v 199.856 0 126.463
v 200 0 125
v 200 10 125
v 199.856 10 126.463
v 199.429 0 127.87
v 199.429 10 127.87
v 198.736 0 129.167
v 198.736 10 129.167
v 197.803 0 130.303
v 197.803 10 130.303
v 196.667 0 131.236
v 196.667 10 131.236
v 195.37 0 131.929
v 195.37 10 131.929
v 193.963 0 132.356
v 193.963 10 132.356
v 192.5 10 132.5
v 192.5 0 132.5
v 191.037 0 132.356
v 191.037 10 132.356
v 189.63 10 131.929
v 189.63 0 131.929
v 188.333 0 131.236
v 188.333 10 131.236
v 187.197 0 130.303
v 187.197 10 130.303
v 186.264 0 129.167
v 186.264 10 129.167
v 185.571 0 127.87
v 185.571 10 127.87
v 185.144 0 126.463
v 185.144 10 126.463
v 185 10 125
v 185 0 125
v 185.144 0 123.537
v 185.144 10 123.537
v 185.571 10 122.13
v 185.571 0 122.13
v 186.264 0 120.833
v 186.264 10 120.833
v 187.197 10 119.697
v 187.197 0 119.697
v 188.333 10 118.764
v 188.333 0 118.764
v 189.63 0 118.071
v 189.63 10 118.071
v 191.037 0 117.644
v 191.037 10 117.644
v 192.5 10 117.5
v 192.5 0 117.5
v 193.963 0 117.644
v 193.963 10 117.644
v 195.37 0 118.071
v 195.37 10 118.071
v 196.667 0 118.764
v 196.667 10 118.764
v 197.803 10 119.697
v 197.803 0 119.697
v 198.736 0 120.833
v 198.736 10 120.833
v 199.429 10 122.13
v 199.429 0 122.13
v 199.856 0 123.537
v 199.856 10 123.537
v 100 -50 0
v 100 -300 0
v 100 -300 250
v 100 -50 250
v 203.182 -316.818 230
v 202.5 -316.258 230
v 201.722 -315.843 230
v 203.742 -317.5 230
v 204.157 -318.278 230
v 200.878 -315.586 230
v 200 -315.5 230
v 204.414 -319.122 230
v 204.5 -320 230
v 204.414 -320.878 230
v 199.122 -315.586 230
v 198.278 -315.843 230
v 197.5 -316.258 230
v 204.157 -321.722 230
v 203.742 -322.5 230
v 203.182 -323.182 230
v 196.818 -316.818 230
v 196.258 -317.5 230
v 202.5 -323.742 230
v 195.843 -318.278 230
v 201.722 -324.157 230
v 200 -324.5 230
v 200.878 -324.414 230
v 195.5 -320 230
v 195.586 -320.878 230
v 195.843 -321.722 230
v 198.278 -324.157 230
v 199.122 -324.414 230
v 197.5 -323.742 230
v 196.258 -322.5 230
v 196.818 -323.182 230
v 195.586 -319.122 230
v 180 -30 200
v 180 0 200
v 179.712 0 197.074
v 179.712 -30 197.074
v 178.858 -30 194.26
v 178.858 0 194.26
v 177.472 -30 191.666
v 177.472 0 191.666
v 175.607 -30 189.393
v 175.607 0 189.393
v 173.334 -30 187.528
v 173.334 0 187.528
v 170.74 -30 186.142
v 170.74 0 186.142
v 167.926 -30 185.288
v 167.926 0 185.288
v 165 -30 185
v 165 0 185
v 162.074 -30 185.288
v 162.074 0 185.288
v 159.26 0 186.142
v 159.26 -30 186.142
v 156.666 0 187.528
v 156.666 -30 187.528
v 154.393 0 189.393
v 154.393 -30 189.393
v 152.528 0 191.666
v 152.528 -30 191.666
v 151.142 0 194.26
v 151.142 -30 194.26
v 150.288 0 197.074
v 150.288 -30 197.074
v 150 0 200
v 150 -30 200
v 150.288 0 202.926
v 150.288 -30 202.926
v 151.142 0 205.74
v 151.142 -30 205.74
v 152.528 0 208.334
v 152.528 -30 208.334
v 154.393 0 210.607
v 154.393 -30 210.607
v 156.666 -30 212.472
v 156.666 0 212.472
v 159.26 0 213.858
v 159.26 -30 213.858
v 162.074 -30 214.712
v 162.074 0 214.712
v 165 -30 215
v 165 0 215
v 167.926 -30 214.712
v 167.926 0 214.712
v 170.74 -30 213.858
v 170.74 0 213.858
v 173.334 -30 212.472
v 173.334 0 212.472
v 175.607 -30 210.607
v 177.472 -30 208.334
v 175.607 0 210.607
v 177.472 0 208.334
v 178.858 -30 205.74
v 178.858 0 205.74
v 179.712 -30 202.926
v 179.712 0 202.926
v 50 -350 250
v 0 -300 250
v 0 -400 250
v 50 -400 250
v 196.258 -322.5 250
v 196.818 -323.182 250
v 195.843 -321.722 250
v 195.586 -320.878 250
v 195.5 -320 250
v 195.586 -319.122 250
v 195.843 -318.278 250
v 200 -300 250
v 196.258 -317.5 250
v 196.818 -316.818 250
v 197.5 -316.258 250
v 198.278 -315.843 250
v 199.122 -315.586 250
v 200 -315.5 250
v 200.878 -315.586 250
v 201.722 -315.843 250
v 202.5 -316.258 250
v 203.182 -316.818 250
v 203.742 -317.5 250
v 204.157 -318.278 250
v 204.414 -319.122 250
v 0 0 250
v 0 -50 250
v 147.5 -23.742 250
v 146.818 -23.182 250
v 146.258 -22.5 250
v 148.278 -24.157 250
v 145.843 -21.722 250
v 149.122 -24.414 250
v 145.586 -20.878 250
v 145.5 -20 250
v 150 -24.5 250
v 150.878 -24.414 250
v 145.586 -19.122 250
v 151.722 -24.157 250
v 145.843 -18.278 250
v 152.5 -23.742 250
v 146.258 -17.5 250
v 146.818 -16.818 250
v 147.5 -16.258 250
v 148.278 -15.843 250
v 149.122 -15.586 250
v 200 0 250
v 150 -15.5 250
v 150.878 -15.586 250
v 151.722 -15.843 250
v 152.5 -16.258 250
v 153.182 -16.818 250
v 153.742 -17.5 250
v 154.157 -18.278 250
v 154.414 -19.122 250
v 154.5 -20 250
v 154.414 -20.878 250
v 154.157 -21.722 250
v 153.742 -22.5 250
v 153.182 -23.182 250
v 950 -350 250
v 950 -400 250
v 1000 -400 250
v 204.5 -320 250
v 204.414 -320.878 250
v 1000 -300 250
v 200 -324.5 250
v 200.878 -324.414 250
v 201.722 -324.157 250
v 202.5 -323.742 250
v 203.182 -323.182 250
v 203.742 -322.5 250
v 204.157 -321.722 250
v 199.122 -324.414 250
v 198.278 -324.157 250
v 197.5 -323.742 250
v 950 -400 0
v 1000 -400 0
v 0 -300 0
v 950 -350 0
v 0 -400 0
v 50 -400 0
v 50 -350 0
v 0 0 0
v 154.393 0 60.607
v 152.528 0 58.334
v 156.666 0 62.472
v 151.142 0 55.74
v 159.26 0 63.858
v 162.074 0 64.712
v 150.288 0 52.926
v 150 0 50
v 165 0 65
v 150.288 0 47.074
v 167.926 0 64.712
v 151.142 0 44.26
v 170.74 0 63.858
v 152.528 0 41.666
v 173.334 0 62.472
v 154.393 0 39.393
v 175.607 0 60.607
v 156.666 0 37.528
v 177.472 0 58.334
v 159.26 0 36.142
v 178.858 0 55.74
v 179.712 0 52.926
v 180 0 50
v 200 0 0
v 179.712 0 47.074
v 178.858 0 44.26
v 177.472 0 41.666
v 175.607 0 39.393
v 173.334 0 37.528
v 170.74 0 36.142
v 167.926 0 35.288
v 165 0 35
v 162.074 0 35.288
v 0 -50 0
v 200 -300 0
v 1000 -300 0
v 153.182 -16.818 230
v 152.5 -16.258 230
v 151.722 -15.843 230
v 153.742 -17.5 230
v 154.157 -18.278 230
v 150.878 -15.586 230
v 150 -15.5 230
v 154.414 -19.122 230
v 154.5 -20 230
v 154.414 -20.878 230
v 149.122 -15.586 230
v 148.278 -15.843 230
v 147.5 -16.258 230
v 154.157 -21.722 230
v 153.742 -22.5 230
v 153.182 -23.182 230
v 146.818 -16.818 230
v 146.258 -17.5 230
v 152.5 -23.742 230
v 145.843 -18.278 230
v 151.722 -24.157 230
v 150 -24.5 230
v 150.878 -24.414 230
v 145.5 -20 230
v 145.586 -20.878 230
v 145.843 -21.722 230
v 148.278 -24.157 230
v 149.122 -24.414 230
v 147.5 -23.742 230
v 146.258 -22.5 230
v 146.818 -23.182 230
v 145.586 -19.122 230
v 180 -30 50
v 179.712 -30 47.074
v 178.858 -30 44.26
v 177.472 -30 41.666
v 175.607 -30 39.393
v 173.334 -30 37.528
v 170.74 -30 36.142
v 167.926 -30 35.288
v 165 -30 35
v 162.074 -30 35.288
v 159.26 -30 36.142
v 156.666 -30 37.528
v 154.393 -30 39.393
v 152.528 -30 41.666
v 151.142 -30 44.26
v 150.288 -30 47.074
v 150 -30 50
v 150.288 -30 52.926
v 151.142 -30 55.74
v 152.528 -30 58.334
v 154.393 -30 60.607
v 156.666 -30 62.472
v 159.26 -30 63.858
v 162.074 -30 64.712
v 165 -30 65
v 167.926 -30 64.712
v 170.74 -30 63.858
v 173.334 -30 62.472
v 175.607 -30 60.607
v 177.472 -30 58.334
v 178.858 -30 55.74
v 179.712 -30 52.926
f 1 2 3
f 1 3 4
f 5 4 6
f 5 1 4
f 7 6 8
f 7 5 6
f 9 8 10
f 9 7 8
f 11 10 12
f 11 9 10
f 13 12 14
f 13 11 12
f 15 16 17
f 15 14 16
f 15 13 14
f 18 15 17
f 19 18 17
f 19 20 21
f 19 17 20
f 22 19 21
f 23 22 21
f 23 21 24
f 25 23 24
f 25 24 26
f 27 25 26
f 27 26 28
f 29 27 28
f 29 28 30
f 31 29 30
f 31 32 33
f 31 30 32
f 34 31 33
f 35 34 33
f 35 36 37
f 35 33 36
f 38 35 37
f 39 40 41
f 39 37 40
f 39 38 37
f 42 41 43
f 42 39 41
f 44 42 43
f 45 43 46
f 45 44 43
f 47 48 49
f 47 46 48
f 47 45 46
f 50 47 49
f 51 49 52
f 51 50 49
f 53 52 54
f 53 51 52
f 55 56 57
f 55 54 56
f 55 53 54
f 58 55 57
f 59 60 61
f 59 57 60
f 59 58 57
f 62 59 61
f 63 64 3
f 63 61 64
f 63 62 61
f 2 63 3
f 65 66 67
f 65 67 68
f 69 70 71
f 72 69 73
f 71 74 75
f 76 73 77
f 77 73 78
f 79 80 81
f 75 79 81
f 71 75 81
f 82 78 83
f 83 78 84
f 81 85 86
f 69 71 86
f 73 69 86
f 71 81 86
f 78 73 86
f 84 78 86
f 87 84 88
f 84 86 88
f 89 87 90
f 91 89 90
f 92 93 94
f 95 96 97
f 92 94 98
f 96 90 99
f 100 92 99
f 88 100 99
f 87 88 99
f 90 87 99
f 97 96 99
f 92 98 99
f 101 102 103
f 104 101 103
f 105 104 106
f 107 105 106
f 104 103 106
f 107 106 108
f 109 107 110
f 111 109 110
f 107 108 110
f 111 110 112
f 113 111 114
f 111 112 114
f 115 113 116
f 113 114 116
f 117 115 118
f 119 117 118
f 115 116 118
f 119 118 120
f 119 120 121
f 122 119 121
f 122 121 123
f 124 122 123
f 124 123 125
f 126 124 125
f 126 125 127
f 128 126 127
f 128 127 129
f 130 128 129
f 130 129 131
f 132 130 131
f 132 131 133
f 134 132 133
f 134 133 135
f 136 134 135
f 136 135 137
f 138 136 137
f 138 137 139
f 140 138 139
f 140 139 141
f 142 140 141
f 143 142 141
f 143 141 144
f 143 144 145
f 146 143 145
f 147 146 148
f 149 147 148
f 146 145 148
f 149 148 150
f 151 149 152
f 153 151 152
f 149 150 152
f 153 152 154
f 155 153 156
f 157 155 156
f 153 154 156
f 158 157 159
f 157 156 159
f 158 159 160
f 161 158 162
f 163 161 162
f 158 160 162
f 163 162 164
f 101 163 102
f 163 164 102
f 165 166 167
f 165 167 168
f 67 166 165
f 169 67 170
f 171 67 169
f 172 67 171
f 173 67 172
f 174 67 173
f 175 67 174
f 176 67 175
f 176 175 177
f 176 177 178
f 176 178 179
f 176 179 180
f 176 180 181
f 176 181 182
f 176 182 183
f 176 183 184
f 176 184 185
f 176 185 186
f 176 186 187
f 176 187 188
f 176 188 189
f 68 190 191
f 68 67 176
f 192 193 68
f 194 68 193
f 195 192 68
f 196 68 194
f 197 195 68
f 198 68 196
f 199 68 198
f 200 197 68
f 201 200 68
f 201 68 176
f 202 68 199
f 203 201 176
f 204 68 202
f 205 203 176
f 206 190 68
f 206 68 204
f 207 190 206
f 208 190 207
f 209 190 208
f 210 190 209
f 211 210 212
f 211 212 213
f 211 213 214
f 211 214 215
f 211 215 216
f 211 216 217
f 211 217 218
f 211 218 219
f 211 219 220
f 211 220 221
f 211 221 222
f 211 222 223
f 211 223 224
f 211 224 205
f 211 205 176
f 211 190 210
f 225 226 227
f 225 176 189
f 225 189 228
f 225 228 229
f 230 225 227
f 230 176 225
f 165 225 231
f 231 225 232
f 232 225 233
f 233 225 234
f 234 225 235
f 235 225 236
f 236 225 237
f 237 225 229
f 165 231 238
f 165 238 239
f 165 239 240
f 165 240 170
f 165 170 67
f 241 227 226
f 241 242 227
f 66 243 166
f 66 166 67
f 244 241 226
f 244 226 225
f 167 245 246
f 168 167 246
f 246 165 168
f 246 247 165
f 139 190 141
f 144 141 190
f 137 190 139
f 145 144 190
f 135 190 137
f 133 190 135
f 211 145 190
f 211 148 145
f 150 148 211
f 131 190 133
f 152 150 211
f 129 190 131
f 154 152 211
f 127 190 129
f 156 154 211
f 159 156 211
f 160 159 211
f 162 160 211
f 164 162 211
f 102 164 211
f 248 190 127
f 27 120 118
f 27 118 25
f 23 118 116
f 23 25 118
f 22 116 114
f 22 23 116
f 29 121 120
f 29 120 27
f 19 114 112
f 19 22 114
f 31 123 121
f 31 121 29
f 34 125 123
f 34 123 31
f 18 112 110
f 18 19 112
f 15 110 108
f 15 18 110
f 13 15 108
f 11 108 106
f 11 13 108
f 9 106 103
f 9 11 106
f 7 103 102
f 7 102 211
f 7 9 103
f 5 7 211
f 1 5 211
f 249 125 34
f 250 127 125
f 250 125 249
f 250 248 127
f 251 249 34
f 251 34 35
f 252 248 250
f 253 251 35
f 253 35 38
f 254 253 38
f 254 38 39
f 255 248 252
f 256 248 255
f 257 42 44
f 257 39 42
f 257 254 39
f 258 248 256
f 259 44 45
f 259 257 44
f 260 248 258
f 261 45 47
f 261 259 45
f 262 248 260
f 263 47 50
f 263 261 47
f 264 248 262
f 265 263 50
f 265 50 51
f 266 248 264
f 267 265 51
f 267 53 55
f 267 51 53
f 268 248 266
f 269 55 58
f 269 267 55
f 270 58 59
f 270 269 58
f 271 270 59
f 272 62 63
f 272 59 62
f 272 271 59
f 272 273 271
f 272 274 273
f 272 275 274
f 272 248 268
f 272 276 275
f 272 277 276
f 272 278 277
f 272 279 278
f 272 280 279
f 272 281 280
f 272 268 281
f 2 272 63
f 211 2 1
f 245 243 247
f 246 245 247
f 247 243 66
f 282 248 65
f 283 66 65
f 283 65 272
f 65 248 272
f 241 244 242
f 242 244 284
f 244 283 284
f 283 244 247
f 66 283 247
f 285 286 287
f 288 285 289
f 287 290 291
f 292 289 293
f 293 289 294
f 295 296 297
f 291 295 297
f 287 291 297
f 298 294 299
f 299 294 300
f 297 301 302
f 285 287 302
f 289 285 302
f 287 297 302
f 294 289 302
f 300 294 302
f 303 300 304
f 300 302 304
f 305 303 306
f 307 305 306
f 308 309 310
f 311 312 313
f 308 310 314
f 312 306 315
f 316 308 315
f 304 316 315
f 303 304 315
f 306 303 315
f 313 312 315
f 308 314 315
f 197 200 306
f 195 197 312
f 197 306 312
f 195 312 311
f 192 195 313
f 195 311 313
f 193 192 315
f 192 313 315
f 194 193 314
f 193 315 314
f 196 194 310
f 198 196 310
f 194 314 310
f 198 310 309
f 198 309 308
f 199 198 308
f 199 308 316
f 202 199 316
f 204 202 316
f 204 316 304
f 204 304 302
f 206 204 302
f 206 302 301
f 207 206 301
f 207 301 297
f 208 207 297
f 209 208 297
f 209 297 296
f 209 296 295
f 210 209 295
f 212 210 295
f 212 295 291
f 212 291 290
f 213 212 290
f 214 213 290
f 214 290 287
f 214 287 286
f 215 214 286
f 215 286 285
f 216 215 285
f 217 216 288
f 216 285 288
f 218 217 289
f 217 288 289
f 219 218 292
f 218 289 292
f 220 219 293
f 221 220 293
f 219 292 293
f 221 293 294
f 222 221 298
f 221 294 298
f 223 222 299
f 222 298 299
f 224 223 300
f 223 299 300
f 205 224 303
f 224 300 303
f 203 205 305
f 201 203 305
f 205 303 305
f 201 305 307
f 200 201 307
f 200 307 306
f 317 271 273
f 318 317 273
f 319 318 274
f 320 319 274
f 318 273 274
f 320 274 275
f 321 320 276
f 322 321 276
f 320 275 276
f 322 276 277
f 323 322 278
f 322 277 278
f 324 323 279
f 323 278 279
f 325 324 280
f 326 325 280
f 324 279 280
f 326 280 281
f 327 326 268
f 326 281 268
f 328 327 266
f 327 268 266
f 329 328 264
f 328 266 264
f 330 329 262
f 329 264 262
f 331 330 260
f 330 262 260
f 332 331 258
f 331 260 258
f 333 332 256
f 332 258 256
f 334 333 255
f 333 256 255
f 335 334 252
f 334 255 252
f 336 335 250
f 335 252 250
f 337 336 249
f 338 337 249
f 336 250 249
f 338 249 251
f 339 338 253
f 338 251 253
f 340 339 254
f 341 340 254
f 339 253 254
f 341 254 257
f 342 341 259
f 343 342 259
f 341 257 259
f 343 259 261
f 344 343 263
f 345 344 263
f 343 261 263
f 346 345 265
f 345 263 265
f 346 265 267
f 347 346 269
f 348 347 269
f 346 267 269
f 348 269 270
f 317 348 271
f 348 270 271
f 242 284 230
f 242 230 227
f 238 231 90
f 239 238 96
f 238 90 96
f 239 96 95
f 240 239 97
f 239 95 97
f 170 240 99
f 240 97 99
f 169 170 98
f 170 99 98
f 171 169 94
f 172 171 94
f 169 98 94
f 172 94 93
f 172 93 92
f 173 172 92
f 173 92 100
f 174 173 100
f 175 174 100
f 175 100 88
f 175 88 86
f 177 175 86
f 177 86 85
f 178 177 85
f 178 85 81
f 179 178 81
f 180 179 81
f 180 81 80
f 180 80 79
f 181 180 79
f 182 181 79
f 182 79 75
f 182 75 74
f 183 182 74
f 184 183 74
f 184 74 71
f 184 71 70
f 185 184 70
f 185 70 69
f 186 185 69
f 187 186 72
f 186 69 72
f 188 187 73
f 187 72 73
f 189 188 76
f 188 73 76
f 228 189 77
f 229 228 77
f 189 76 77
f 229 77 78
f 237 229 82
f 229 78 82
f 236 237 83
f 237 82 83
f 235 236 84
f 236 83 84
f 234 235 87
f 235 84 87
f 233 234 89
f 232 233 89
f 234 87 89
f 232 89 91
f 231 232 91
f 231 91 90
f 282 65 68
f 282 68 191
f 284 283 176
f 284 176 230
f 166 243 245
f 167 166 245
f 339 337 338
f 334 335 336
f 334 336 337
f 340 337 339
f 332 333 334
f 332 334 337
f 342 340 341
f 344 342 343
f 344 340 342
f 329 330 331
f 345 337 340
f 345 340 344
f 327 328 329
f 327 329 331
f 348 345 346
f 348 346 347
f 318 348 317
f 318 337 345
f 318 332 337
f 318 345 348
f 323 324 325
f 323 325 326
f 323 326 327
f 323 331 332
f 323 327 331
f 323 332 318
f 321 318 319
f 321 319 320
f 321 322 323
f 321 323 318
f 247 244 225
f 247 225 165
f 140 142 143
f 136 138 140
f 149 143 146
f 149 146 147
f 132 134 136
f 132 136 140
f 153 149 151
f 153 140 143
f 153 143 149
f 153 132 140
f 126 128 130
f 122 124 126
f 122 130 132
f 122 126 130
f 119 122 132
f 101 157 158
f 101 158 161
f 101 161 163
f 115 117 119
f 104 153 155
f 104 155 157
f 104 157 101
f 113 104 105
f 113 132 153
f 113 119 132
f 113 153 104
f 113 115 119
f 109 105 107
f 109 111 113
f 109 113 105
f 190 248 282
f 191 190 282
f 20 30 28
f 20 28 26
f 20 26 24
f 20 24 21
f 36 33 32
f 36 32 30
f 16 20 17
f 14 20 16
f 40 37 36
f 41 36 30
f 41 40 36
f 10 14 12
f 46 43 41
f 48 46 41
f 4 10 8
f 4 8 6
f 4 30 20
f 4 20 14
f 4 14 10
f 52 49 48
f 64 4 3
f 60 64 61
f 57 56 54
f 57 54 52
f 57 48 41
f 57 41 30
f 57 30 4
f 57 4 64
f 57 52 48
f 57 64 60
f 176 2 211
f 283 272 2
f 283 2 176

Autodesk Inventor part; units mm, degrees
ref_plane "YZ Plane" through (0, 0, 0) normal (1, 0, 0) x (0, 1, 0)
ref_plane "XZ Plane" through (0, 0, 0) normal (0, 1, 0) x (-1, 0, 0)
ref_plane "XY Plane" through (0, 0, 0) normal (0, 0, 1) x (1, 0, 0)
sketch "Sketch1" plane through (0, 0, 0) normal (0, 0, 1) x (1, 0, 0)
  line L0 (0, 0) -> (200, 0)
  line L1 (200, 0) -> (200, -300)
  line L2 (200, -300) -> (1000, -300)
  line L3 (1000, -300) -> (1000, -400)
  line L4 (1000, -400) -> (950, -400)
  line L5 (950, -400) -> (950, -350)
  line L6 (950, -350) -> (50, -350)
  line L7 (50, -350) -> (50, -400)
  line L8 (0, -400) -> (50, -400)
  line L9 (950, -400) -> (1000, -400)
  line L10 (0, -300) -> (100, -300)
  line L11 (100, -300) -> (100, -50)
  line L12 (100, -50) -> (0, -50)
  line L13 (0, 0) -> (0, -50)
  line L14 (0, -300) -> (0, -400)
  dimension "d0" = 200
  dimension "d1" = 300
  dimension "d2" = 800
  dimension "d3" = 100
  dimension "d41" = 50
  dimension "d42" = 900
  dimension "d43" = 100
  dimension "d44" = 250
extrude "Extrusion1" add sketch "Sketch1" along normal blind 250
sketch "Sketch2" plane through (0, 0, 0) normal (0, 1, 0) x (1, 0, 0)
  line L0 (200, 0) -> (0, 0) projected
  line L1 (200, 0) -> (150, 0)
  line L2 (200, -250) -> (0, -250) projected
  line L3 (200, -250) -> (150, -250)
  circle A0 centre (165, -50) radius 15
  circle A1 centre (165, -200) radius 15
  line L4 (200, 0) -> (200, -250) projected
  dimension "d9" = 50
  dimension "d11" = 30
  dimension "d12" = 30
  dimension "d36" = 35
  dimension "d37" = 35
  dimension "d49" = 150
sketch "Sketch4" plane through (0, 0, 0) normal (0, 1, 0) x (1, 0, 0)
  line L0 (200, 0) -> (200, -250) projected
  line L1 (200, -125) -> (192.5, -125)
  circle A0 centre (192.5, -125) radius 7.5
  point P0 (0, 0)
  dimension "d38" = 7.5
extrude "Extrusion7" add sketch "Sketch4" along normal blind 10
extrude "Extrusion8" cut sketch "Sketch2" against normal blind 30
sketch "Sketch6" plane through (0, 0, 250) normal (0, 0, 1) x (1, 0, 0)
  line L0 (100, -50) -> (100, -300) projected
  line L1 (100, -300) -> (0, -300) projected
  line L2 (0, -300) -> (0, -400) projected
  line L3 (0, -400) -> (50, -400) projected
  line L4 (50, -400) -> (50, -350) projected
  line L5 (50, -350) -> (950, -350) projected
  line L6 (950, -350) -> (950, -400) projected
  line L7 (950, -400) -> (1000, -400) projected
  line L8 (1000, -400) -> (1000, -300) projected
  line L9 (1000, -300) -> (200, -300) projected
  line L10 (200, -300) -> (200, 0) projected
  line L11 (200, 0) -> (0, 0) projected
  line L12 (0, 0) -> (0, -50) projected
  line L13 (0, -50) -> (100, -50) projected
  line L14 (200, -400) -> (200, -320)
  line L15 (200, -400) -> (215.7164, -400)
  line L16 (215.7164, -400) -> (915.7164, -400)
  line L17 (915.7164, -400) -> (915.7164, -330)
  circle A0 centre (915.7164, -330) radius 10.5844
  line L18 (200, 0) -> (150, 0)
  line L19 (200, 0) -> (0, 0) projected
  line L20 (150, 0) -> (150, -20)
  circle A1 centre (150, -20) radius 3
  dimension "d40" = 0
  dimension "d50" = 80
  dimension "d51" = 700
  dimension "d52" = 70
  dimension "d53" = 50
  dimension "d54" = 20
  dimension "d55" = 6
hole "Hole2" at (150, -20, 250) direction (0, 0, -1) diameter 9 depth 20
hole "Hole3" at (200, -320, 250) direction (0, 0, -1) diameter 9 depth 20
properties part number "Platform" material "Wood (Walnut)"
